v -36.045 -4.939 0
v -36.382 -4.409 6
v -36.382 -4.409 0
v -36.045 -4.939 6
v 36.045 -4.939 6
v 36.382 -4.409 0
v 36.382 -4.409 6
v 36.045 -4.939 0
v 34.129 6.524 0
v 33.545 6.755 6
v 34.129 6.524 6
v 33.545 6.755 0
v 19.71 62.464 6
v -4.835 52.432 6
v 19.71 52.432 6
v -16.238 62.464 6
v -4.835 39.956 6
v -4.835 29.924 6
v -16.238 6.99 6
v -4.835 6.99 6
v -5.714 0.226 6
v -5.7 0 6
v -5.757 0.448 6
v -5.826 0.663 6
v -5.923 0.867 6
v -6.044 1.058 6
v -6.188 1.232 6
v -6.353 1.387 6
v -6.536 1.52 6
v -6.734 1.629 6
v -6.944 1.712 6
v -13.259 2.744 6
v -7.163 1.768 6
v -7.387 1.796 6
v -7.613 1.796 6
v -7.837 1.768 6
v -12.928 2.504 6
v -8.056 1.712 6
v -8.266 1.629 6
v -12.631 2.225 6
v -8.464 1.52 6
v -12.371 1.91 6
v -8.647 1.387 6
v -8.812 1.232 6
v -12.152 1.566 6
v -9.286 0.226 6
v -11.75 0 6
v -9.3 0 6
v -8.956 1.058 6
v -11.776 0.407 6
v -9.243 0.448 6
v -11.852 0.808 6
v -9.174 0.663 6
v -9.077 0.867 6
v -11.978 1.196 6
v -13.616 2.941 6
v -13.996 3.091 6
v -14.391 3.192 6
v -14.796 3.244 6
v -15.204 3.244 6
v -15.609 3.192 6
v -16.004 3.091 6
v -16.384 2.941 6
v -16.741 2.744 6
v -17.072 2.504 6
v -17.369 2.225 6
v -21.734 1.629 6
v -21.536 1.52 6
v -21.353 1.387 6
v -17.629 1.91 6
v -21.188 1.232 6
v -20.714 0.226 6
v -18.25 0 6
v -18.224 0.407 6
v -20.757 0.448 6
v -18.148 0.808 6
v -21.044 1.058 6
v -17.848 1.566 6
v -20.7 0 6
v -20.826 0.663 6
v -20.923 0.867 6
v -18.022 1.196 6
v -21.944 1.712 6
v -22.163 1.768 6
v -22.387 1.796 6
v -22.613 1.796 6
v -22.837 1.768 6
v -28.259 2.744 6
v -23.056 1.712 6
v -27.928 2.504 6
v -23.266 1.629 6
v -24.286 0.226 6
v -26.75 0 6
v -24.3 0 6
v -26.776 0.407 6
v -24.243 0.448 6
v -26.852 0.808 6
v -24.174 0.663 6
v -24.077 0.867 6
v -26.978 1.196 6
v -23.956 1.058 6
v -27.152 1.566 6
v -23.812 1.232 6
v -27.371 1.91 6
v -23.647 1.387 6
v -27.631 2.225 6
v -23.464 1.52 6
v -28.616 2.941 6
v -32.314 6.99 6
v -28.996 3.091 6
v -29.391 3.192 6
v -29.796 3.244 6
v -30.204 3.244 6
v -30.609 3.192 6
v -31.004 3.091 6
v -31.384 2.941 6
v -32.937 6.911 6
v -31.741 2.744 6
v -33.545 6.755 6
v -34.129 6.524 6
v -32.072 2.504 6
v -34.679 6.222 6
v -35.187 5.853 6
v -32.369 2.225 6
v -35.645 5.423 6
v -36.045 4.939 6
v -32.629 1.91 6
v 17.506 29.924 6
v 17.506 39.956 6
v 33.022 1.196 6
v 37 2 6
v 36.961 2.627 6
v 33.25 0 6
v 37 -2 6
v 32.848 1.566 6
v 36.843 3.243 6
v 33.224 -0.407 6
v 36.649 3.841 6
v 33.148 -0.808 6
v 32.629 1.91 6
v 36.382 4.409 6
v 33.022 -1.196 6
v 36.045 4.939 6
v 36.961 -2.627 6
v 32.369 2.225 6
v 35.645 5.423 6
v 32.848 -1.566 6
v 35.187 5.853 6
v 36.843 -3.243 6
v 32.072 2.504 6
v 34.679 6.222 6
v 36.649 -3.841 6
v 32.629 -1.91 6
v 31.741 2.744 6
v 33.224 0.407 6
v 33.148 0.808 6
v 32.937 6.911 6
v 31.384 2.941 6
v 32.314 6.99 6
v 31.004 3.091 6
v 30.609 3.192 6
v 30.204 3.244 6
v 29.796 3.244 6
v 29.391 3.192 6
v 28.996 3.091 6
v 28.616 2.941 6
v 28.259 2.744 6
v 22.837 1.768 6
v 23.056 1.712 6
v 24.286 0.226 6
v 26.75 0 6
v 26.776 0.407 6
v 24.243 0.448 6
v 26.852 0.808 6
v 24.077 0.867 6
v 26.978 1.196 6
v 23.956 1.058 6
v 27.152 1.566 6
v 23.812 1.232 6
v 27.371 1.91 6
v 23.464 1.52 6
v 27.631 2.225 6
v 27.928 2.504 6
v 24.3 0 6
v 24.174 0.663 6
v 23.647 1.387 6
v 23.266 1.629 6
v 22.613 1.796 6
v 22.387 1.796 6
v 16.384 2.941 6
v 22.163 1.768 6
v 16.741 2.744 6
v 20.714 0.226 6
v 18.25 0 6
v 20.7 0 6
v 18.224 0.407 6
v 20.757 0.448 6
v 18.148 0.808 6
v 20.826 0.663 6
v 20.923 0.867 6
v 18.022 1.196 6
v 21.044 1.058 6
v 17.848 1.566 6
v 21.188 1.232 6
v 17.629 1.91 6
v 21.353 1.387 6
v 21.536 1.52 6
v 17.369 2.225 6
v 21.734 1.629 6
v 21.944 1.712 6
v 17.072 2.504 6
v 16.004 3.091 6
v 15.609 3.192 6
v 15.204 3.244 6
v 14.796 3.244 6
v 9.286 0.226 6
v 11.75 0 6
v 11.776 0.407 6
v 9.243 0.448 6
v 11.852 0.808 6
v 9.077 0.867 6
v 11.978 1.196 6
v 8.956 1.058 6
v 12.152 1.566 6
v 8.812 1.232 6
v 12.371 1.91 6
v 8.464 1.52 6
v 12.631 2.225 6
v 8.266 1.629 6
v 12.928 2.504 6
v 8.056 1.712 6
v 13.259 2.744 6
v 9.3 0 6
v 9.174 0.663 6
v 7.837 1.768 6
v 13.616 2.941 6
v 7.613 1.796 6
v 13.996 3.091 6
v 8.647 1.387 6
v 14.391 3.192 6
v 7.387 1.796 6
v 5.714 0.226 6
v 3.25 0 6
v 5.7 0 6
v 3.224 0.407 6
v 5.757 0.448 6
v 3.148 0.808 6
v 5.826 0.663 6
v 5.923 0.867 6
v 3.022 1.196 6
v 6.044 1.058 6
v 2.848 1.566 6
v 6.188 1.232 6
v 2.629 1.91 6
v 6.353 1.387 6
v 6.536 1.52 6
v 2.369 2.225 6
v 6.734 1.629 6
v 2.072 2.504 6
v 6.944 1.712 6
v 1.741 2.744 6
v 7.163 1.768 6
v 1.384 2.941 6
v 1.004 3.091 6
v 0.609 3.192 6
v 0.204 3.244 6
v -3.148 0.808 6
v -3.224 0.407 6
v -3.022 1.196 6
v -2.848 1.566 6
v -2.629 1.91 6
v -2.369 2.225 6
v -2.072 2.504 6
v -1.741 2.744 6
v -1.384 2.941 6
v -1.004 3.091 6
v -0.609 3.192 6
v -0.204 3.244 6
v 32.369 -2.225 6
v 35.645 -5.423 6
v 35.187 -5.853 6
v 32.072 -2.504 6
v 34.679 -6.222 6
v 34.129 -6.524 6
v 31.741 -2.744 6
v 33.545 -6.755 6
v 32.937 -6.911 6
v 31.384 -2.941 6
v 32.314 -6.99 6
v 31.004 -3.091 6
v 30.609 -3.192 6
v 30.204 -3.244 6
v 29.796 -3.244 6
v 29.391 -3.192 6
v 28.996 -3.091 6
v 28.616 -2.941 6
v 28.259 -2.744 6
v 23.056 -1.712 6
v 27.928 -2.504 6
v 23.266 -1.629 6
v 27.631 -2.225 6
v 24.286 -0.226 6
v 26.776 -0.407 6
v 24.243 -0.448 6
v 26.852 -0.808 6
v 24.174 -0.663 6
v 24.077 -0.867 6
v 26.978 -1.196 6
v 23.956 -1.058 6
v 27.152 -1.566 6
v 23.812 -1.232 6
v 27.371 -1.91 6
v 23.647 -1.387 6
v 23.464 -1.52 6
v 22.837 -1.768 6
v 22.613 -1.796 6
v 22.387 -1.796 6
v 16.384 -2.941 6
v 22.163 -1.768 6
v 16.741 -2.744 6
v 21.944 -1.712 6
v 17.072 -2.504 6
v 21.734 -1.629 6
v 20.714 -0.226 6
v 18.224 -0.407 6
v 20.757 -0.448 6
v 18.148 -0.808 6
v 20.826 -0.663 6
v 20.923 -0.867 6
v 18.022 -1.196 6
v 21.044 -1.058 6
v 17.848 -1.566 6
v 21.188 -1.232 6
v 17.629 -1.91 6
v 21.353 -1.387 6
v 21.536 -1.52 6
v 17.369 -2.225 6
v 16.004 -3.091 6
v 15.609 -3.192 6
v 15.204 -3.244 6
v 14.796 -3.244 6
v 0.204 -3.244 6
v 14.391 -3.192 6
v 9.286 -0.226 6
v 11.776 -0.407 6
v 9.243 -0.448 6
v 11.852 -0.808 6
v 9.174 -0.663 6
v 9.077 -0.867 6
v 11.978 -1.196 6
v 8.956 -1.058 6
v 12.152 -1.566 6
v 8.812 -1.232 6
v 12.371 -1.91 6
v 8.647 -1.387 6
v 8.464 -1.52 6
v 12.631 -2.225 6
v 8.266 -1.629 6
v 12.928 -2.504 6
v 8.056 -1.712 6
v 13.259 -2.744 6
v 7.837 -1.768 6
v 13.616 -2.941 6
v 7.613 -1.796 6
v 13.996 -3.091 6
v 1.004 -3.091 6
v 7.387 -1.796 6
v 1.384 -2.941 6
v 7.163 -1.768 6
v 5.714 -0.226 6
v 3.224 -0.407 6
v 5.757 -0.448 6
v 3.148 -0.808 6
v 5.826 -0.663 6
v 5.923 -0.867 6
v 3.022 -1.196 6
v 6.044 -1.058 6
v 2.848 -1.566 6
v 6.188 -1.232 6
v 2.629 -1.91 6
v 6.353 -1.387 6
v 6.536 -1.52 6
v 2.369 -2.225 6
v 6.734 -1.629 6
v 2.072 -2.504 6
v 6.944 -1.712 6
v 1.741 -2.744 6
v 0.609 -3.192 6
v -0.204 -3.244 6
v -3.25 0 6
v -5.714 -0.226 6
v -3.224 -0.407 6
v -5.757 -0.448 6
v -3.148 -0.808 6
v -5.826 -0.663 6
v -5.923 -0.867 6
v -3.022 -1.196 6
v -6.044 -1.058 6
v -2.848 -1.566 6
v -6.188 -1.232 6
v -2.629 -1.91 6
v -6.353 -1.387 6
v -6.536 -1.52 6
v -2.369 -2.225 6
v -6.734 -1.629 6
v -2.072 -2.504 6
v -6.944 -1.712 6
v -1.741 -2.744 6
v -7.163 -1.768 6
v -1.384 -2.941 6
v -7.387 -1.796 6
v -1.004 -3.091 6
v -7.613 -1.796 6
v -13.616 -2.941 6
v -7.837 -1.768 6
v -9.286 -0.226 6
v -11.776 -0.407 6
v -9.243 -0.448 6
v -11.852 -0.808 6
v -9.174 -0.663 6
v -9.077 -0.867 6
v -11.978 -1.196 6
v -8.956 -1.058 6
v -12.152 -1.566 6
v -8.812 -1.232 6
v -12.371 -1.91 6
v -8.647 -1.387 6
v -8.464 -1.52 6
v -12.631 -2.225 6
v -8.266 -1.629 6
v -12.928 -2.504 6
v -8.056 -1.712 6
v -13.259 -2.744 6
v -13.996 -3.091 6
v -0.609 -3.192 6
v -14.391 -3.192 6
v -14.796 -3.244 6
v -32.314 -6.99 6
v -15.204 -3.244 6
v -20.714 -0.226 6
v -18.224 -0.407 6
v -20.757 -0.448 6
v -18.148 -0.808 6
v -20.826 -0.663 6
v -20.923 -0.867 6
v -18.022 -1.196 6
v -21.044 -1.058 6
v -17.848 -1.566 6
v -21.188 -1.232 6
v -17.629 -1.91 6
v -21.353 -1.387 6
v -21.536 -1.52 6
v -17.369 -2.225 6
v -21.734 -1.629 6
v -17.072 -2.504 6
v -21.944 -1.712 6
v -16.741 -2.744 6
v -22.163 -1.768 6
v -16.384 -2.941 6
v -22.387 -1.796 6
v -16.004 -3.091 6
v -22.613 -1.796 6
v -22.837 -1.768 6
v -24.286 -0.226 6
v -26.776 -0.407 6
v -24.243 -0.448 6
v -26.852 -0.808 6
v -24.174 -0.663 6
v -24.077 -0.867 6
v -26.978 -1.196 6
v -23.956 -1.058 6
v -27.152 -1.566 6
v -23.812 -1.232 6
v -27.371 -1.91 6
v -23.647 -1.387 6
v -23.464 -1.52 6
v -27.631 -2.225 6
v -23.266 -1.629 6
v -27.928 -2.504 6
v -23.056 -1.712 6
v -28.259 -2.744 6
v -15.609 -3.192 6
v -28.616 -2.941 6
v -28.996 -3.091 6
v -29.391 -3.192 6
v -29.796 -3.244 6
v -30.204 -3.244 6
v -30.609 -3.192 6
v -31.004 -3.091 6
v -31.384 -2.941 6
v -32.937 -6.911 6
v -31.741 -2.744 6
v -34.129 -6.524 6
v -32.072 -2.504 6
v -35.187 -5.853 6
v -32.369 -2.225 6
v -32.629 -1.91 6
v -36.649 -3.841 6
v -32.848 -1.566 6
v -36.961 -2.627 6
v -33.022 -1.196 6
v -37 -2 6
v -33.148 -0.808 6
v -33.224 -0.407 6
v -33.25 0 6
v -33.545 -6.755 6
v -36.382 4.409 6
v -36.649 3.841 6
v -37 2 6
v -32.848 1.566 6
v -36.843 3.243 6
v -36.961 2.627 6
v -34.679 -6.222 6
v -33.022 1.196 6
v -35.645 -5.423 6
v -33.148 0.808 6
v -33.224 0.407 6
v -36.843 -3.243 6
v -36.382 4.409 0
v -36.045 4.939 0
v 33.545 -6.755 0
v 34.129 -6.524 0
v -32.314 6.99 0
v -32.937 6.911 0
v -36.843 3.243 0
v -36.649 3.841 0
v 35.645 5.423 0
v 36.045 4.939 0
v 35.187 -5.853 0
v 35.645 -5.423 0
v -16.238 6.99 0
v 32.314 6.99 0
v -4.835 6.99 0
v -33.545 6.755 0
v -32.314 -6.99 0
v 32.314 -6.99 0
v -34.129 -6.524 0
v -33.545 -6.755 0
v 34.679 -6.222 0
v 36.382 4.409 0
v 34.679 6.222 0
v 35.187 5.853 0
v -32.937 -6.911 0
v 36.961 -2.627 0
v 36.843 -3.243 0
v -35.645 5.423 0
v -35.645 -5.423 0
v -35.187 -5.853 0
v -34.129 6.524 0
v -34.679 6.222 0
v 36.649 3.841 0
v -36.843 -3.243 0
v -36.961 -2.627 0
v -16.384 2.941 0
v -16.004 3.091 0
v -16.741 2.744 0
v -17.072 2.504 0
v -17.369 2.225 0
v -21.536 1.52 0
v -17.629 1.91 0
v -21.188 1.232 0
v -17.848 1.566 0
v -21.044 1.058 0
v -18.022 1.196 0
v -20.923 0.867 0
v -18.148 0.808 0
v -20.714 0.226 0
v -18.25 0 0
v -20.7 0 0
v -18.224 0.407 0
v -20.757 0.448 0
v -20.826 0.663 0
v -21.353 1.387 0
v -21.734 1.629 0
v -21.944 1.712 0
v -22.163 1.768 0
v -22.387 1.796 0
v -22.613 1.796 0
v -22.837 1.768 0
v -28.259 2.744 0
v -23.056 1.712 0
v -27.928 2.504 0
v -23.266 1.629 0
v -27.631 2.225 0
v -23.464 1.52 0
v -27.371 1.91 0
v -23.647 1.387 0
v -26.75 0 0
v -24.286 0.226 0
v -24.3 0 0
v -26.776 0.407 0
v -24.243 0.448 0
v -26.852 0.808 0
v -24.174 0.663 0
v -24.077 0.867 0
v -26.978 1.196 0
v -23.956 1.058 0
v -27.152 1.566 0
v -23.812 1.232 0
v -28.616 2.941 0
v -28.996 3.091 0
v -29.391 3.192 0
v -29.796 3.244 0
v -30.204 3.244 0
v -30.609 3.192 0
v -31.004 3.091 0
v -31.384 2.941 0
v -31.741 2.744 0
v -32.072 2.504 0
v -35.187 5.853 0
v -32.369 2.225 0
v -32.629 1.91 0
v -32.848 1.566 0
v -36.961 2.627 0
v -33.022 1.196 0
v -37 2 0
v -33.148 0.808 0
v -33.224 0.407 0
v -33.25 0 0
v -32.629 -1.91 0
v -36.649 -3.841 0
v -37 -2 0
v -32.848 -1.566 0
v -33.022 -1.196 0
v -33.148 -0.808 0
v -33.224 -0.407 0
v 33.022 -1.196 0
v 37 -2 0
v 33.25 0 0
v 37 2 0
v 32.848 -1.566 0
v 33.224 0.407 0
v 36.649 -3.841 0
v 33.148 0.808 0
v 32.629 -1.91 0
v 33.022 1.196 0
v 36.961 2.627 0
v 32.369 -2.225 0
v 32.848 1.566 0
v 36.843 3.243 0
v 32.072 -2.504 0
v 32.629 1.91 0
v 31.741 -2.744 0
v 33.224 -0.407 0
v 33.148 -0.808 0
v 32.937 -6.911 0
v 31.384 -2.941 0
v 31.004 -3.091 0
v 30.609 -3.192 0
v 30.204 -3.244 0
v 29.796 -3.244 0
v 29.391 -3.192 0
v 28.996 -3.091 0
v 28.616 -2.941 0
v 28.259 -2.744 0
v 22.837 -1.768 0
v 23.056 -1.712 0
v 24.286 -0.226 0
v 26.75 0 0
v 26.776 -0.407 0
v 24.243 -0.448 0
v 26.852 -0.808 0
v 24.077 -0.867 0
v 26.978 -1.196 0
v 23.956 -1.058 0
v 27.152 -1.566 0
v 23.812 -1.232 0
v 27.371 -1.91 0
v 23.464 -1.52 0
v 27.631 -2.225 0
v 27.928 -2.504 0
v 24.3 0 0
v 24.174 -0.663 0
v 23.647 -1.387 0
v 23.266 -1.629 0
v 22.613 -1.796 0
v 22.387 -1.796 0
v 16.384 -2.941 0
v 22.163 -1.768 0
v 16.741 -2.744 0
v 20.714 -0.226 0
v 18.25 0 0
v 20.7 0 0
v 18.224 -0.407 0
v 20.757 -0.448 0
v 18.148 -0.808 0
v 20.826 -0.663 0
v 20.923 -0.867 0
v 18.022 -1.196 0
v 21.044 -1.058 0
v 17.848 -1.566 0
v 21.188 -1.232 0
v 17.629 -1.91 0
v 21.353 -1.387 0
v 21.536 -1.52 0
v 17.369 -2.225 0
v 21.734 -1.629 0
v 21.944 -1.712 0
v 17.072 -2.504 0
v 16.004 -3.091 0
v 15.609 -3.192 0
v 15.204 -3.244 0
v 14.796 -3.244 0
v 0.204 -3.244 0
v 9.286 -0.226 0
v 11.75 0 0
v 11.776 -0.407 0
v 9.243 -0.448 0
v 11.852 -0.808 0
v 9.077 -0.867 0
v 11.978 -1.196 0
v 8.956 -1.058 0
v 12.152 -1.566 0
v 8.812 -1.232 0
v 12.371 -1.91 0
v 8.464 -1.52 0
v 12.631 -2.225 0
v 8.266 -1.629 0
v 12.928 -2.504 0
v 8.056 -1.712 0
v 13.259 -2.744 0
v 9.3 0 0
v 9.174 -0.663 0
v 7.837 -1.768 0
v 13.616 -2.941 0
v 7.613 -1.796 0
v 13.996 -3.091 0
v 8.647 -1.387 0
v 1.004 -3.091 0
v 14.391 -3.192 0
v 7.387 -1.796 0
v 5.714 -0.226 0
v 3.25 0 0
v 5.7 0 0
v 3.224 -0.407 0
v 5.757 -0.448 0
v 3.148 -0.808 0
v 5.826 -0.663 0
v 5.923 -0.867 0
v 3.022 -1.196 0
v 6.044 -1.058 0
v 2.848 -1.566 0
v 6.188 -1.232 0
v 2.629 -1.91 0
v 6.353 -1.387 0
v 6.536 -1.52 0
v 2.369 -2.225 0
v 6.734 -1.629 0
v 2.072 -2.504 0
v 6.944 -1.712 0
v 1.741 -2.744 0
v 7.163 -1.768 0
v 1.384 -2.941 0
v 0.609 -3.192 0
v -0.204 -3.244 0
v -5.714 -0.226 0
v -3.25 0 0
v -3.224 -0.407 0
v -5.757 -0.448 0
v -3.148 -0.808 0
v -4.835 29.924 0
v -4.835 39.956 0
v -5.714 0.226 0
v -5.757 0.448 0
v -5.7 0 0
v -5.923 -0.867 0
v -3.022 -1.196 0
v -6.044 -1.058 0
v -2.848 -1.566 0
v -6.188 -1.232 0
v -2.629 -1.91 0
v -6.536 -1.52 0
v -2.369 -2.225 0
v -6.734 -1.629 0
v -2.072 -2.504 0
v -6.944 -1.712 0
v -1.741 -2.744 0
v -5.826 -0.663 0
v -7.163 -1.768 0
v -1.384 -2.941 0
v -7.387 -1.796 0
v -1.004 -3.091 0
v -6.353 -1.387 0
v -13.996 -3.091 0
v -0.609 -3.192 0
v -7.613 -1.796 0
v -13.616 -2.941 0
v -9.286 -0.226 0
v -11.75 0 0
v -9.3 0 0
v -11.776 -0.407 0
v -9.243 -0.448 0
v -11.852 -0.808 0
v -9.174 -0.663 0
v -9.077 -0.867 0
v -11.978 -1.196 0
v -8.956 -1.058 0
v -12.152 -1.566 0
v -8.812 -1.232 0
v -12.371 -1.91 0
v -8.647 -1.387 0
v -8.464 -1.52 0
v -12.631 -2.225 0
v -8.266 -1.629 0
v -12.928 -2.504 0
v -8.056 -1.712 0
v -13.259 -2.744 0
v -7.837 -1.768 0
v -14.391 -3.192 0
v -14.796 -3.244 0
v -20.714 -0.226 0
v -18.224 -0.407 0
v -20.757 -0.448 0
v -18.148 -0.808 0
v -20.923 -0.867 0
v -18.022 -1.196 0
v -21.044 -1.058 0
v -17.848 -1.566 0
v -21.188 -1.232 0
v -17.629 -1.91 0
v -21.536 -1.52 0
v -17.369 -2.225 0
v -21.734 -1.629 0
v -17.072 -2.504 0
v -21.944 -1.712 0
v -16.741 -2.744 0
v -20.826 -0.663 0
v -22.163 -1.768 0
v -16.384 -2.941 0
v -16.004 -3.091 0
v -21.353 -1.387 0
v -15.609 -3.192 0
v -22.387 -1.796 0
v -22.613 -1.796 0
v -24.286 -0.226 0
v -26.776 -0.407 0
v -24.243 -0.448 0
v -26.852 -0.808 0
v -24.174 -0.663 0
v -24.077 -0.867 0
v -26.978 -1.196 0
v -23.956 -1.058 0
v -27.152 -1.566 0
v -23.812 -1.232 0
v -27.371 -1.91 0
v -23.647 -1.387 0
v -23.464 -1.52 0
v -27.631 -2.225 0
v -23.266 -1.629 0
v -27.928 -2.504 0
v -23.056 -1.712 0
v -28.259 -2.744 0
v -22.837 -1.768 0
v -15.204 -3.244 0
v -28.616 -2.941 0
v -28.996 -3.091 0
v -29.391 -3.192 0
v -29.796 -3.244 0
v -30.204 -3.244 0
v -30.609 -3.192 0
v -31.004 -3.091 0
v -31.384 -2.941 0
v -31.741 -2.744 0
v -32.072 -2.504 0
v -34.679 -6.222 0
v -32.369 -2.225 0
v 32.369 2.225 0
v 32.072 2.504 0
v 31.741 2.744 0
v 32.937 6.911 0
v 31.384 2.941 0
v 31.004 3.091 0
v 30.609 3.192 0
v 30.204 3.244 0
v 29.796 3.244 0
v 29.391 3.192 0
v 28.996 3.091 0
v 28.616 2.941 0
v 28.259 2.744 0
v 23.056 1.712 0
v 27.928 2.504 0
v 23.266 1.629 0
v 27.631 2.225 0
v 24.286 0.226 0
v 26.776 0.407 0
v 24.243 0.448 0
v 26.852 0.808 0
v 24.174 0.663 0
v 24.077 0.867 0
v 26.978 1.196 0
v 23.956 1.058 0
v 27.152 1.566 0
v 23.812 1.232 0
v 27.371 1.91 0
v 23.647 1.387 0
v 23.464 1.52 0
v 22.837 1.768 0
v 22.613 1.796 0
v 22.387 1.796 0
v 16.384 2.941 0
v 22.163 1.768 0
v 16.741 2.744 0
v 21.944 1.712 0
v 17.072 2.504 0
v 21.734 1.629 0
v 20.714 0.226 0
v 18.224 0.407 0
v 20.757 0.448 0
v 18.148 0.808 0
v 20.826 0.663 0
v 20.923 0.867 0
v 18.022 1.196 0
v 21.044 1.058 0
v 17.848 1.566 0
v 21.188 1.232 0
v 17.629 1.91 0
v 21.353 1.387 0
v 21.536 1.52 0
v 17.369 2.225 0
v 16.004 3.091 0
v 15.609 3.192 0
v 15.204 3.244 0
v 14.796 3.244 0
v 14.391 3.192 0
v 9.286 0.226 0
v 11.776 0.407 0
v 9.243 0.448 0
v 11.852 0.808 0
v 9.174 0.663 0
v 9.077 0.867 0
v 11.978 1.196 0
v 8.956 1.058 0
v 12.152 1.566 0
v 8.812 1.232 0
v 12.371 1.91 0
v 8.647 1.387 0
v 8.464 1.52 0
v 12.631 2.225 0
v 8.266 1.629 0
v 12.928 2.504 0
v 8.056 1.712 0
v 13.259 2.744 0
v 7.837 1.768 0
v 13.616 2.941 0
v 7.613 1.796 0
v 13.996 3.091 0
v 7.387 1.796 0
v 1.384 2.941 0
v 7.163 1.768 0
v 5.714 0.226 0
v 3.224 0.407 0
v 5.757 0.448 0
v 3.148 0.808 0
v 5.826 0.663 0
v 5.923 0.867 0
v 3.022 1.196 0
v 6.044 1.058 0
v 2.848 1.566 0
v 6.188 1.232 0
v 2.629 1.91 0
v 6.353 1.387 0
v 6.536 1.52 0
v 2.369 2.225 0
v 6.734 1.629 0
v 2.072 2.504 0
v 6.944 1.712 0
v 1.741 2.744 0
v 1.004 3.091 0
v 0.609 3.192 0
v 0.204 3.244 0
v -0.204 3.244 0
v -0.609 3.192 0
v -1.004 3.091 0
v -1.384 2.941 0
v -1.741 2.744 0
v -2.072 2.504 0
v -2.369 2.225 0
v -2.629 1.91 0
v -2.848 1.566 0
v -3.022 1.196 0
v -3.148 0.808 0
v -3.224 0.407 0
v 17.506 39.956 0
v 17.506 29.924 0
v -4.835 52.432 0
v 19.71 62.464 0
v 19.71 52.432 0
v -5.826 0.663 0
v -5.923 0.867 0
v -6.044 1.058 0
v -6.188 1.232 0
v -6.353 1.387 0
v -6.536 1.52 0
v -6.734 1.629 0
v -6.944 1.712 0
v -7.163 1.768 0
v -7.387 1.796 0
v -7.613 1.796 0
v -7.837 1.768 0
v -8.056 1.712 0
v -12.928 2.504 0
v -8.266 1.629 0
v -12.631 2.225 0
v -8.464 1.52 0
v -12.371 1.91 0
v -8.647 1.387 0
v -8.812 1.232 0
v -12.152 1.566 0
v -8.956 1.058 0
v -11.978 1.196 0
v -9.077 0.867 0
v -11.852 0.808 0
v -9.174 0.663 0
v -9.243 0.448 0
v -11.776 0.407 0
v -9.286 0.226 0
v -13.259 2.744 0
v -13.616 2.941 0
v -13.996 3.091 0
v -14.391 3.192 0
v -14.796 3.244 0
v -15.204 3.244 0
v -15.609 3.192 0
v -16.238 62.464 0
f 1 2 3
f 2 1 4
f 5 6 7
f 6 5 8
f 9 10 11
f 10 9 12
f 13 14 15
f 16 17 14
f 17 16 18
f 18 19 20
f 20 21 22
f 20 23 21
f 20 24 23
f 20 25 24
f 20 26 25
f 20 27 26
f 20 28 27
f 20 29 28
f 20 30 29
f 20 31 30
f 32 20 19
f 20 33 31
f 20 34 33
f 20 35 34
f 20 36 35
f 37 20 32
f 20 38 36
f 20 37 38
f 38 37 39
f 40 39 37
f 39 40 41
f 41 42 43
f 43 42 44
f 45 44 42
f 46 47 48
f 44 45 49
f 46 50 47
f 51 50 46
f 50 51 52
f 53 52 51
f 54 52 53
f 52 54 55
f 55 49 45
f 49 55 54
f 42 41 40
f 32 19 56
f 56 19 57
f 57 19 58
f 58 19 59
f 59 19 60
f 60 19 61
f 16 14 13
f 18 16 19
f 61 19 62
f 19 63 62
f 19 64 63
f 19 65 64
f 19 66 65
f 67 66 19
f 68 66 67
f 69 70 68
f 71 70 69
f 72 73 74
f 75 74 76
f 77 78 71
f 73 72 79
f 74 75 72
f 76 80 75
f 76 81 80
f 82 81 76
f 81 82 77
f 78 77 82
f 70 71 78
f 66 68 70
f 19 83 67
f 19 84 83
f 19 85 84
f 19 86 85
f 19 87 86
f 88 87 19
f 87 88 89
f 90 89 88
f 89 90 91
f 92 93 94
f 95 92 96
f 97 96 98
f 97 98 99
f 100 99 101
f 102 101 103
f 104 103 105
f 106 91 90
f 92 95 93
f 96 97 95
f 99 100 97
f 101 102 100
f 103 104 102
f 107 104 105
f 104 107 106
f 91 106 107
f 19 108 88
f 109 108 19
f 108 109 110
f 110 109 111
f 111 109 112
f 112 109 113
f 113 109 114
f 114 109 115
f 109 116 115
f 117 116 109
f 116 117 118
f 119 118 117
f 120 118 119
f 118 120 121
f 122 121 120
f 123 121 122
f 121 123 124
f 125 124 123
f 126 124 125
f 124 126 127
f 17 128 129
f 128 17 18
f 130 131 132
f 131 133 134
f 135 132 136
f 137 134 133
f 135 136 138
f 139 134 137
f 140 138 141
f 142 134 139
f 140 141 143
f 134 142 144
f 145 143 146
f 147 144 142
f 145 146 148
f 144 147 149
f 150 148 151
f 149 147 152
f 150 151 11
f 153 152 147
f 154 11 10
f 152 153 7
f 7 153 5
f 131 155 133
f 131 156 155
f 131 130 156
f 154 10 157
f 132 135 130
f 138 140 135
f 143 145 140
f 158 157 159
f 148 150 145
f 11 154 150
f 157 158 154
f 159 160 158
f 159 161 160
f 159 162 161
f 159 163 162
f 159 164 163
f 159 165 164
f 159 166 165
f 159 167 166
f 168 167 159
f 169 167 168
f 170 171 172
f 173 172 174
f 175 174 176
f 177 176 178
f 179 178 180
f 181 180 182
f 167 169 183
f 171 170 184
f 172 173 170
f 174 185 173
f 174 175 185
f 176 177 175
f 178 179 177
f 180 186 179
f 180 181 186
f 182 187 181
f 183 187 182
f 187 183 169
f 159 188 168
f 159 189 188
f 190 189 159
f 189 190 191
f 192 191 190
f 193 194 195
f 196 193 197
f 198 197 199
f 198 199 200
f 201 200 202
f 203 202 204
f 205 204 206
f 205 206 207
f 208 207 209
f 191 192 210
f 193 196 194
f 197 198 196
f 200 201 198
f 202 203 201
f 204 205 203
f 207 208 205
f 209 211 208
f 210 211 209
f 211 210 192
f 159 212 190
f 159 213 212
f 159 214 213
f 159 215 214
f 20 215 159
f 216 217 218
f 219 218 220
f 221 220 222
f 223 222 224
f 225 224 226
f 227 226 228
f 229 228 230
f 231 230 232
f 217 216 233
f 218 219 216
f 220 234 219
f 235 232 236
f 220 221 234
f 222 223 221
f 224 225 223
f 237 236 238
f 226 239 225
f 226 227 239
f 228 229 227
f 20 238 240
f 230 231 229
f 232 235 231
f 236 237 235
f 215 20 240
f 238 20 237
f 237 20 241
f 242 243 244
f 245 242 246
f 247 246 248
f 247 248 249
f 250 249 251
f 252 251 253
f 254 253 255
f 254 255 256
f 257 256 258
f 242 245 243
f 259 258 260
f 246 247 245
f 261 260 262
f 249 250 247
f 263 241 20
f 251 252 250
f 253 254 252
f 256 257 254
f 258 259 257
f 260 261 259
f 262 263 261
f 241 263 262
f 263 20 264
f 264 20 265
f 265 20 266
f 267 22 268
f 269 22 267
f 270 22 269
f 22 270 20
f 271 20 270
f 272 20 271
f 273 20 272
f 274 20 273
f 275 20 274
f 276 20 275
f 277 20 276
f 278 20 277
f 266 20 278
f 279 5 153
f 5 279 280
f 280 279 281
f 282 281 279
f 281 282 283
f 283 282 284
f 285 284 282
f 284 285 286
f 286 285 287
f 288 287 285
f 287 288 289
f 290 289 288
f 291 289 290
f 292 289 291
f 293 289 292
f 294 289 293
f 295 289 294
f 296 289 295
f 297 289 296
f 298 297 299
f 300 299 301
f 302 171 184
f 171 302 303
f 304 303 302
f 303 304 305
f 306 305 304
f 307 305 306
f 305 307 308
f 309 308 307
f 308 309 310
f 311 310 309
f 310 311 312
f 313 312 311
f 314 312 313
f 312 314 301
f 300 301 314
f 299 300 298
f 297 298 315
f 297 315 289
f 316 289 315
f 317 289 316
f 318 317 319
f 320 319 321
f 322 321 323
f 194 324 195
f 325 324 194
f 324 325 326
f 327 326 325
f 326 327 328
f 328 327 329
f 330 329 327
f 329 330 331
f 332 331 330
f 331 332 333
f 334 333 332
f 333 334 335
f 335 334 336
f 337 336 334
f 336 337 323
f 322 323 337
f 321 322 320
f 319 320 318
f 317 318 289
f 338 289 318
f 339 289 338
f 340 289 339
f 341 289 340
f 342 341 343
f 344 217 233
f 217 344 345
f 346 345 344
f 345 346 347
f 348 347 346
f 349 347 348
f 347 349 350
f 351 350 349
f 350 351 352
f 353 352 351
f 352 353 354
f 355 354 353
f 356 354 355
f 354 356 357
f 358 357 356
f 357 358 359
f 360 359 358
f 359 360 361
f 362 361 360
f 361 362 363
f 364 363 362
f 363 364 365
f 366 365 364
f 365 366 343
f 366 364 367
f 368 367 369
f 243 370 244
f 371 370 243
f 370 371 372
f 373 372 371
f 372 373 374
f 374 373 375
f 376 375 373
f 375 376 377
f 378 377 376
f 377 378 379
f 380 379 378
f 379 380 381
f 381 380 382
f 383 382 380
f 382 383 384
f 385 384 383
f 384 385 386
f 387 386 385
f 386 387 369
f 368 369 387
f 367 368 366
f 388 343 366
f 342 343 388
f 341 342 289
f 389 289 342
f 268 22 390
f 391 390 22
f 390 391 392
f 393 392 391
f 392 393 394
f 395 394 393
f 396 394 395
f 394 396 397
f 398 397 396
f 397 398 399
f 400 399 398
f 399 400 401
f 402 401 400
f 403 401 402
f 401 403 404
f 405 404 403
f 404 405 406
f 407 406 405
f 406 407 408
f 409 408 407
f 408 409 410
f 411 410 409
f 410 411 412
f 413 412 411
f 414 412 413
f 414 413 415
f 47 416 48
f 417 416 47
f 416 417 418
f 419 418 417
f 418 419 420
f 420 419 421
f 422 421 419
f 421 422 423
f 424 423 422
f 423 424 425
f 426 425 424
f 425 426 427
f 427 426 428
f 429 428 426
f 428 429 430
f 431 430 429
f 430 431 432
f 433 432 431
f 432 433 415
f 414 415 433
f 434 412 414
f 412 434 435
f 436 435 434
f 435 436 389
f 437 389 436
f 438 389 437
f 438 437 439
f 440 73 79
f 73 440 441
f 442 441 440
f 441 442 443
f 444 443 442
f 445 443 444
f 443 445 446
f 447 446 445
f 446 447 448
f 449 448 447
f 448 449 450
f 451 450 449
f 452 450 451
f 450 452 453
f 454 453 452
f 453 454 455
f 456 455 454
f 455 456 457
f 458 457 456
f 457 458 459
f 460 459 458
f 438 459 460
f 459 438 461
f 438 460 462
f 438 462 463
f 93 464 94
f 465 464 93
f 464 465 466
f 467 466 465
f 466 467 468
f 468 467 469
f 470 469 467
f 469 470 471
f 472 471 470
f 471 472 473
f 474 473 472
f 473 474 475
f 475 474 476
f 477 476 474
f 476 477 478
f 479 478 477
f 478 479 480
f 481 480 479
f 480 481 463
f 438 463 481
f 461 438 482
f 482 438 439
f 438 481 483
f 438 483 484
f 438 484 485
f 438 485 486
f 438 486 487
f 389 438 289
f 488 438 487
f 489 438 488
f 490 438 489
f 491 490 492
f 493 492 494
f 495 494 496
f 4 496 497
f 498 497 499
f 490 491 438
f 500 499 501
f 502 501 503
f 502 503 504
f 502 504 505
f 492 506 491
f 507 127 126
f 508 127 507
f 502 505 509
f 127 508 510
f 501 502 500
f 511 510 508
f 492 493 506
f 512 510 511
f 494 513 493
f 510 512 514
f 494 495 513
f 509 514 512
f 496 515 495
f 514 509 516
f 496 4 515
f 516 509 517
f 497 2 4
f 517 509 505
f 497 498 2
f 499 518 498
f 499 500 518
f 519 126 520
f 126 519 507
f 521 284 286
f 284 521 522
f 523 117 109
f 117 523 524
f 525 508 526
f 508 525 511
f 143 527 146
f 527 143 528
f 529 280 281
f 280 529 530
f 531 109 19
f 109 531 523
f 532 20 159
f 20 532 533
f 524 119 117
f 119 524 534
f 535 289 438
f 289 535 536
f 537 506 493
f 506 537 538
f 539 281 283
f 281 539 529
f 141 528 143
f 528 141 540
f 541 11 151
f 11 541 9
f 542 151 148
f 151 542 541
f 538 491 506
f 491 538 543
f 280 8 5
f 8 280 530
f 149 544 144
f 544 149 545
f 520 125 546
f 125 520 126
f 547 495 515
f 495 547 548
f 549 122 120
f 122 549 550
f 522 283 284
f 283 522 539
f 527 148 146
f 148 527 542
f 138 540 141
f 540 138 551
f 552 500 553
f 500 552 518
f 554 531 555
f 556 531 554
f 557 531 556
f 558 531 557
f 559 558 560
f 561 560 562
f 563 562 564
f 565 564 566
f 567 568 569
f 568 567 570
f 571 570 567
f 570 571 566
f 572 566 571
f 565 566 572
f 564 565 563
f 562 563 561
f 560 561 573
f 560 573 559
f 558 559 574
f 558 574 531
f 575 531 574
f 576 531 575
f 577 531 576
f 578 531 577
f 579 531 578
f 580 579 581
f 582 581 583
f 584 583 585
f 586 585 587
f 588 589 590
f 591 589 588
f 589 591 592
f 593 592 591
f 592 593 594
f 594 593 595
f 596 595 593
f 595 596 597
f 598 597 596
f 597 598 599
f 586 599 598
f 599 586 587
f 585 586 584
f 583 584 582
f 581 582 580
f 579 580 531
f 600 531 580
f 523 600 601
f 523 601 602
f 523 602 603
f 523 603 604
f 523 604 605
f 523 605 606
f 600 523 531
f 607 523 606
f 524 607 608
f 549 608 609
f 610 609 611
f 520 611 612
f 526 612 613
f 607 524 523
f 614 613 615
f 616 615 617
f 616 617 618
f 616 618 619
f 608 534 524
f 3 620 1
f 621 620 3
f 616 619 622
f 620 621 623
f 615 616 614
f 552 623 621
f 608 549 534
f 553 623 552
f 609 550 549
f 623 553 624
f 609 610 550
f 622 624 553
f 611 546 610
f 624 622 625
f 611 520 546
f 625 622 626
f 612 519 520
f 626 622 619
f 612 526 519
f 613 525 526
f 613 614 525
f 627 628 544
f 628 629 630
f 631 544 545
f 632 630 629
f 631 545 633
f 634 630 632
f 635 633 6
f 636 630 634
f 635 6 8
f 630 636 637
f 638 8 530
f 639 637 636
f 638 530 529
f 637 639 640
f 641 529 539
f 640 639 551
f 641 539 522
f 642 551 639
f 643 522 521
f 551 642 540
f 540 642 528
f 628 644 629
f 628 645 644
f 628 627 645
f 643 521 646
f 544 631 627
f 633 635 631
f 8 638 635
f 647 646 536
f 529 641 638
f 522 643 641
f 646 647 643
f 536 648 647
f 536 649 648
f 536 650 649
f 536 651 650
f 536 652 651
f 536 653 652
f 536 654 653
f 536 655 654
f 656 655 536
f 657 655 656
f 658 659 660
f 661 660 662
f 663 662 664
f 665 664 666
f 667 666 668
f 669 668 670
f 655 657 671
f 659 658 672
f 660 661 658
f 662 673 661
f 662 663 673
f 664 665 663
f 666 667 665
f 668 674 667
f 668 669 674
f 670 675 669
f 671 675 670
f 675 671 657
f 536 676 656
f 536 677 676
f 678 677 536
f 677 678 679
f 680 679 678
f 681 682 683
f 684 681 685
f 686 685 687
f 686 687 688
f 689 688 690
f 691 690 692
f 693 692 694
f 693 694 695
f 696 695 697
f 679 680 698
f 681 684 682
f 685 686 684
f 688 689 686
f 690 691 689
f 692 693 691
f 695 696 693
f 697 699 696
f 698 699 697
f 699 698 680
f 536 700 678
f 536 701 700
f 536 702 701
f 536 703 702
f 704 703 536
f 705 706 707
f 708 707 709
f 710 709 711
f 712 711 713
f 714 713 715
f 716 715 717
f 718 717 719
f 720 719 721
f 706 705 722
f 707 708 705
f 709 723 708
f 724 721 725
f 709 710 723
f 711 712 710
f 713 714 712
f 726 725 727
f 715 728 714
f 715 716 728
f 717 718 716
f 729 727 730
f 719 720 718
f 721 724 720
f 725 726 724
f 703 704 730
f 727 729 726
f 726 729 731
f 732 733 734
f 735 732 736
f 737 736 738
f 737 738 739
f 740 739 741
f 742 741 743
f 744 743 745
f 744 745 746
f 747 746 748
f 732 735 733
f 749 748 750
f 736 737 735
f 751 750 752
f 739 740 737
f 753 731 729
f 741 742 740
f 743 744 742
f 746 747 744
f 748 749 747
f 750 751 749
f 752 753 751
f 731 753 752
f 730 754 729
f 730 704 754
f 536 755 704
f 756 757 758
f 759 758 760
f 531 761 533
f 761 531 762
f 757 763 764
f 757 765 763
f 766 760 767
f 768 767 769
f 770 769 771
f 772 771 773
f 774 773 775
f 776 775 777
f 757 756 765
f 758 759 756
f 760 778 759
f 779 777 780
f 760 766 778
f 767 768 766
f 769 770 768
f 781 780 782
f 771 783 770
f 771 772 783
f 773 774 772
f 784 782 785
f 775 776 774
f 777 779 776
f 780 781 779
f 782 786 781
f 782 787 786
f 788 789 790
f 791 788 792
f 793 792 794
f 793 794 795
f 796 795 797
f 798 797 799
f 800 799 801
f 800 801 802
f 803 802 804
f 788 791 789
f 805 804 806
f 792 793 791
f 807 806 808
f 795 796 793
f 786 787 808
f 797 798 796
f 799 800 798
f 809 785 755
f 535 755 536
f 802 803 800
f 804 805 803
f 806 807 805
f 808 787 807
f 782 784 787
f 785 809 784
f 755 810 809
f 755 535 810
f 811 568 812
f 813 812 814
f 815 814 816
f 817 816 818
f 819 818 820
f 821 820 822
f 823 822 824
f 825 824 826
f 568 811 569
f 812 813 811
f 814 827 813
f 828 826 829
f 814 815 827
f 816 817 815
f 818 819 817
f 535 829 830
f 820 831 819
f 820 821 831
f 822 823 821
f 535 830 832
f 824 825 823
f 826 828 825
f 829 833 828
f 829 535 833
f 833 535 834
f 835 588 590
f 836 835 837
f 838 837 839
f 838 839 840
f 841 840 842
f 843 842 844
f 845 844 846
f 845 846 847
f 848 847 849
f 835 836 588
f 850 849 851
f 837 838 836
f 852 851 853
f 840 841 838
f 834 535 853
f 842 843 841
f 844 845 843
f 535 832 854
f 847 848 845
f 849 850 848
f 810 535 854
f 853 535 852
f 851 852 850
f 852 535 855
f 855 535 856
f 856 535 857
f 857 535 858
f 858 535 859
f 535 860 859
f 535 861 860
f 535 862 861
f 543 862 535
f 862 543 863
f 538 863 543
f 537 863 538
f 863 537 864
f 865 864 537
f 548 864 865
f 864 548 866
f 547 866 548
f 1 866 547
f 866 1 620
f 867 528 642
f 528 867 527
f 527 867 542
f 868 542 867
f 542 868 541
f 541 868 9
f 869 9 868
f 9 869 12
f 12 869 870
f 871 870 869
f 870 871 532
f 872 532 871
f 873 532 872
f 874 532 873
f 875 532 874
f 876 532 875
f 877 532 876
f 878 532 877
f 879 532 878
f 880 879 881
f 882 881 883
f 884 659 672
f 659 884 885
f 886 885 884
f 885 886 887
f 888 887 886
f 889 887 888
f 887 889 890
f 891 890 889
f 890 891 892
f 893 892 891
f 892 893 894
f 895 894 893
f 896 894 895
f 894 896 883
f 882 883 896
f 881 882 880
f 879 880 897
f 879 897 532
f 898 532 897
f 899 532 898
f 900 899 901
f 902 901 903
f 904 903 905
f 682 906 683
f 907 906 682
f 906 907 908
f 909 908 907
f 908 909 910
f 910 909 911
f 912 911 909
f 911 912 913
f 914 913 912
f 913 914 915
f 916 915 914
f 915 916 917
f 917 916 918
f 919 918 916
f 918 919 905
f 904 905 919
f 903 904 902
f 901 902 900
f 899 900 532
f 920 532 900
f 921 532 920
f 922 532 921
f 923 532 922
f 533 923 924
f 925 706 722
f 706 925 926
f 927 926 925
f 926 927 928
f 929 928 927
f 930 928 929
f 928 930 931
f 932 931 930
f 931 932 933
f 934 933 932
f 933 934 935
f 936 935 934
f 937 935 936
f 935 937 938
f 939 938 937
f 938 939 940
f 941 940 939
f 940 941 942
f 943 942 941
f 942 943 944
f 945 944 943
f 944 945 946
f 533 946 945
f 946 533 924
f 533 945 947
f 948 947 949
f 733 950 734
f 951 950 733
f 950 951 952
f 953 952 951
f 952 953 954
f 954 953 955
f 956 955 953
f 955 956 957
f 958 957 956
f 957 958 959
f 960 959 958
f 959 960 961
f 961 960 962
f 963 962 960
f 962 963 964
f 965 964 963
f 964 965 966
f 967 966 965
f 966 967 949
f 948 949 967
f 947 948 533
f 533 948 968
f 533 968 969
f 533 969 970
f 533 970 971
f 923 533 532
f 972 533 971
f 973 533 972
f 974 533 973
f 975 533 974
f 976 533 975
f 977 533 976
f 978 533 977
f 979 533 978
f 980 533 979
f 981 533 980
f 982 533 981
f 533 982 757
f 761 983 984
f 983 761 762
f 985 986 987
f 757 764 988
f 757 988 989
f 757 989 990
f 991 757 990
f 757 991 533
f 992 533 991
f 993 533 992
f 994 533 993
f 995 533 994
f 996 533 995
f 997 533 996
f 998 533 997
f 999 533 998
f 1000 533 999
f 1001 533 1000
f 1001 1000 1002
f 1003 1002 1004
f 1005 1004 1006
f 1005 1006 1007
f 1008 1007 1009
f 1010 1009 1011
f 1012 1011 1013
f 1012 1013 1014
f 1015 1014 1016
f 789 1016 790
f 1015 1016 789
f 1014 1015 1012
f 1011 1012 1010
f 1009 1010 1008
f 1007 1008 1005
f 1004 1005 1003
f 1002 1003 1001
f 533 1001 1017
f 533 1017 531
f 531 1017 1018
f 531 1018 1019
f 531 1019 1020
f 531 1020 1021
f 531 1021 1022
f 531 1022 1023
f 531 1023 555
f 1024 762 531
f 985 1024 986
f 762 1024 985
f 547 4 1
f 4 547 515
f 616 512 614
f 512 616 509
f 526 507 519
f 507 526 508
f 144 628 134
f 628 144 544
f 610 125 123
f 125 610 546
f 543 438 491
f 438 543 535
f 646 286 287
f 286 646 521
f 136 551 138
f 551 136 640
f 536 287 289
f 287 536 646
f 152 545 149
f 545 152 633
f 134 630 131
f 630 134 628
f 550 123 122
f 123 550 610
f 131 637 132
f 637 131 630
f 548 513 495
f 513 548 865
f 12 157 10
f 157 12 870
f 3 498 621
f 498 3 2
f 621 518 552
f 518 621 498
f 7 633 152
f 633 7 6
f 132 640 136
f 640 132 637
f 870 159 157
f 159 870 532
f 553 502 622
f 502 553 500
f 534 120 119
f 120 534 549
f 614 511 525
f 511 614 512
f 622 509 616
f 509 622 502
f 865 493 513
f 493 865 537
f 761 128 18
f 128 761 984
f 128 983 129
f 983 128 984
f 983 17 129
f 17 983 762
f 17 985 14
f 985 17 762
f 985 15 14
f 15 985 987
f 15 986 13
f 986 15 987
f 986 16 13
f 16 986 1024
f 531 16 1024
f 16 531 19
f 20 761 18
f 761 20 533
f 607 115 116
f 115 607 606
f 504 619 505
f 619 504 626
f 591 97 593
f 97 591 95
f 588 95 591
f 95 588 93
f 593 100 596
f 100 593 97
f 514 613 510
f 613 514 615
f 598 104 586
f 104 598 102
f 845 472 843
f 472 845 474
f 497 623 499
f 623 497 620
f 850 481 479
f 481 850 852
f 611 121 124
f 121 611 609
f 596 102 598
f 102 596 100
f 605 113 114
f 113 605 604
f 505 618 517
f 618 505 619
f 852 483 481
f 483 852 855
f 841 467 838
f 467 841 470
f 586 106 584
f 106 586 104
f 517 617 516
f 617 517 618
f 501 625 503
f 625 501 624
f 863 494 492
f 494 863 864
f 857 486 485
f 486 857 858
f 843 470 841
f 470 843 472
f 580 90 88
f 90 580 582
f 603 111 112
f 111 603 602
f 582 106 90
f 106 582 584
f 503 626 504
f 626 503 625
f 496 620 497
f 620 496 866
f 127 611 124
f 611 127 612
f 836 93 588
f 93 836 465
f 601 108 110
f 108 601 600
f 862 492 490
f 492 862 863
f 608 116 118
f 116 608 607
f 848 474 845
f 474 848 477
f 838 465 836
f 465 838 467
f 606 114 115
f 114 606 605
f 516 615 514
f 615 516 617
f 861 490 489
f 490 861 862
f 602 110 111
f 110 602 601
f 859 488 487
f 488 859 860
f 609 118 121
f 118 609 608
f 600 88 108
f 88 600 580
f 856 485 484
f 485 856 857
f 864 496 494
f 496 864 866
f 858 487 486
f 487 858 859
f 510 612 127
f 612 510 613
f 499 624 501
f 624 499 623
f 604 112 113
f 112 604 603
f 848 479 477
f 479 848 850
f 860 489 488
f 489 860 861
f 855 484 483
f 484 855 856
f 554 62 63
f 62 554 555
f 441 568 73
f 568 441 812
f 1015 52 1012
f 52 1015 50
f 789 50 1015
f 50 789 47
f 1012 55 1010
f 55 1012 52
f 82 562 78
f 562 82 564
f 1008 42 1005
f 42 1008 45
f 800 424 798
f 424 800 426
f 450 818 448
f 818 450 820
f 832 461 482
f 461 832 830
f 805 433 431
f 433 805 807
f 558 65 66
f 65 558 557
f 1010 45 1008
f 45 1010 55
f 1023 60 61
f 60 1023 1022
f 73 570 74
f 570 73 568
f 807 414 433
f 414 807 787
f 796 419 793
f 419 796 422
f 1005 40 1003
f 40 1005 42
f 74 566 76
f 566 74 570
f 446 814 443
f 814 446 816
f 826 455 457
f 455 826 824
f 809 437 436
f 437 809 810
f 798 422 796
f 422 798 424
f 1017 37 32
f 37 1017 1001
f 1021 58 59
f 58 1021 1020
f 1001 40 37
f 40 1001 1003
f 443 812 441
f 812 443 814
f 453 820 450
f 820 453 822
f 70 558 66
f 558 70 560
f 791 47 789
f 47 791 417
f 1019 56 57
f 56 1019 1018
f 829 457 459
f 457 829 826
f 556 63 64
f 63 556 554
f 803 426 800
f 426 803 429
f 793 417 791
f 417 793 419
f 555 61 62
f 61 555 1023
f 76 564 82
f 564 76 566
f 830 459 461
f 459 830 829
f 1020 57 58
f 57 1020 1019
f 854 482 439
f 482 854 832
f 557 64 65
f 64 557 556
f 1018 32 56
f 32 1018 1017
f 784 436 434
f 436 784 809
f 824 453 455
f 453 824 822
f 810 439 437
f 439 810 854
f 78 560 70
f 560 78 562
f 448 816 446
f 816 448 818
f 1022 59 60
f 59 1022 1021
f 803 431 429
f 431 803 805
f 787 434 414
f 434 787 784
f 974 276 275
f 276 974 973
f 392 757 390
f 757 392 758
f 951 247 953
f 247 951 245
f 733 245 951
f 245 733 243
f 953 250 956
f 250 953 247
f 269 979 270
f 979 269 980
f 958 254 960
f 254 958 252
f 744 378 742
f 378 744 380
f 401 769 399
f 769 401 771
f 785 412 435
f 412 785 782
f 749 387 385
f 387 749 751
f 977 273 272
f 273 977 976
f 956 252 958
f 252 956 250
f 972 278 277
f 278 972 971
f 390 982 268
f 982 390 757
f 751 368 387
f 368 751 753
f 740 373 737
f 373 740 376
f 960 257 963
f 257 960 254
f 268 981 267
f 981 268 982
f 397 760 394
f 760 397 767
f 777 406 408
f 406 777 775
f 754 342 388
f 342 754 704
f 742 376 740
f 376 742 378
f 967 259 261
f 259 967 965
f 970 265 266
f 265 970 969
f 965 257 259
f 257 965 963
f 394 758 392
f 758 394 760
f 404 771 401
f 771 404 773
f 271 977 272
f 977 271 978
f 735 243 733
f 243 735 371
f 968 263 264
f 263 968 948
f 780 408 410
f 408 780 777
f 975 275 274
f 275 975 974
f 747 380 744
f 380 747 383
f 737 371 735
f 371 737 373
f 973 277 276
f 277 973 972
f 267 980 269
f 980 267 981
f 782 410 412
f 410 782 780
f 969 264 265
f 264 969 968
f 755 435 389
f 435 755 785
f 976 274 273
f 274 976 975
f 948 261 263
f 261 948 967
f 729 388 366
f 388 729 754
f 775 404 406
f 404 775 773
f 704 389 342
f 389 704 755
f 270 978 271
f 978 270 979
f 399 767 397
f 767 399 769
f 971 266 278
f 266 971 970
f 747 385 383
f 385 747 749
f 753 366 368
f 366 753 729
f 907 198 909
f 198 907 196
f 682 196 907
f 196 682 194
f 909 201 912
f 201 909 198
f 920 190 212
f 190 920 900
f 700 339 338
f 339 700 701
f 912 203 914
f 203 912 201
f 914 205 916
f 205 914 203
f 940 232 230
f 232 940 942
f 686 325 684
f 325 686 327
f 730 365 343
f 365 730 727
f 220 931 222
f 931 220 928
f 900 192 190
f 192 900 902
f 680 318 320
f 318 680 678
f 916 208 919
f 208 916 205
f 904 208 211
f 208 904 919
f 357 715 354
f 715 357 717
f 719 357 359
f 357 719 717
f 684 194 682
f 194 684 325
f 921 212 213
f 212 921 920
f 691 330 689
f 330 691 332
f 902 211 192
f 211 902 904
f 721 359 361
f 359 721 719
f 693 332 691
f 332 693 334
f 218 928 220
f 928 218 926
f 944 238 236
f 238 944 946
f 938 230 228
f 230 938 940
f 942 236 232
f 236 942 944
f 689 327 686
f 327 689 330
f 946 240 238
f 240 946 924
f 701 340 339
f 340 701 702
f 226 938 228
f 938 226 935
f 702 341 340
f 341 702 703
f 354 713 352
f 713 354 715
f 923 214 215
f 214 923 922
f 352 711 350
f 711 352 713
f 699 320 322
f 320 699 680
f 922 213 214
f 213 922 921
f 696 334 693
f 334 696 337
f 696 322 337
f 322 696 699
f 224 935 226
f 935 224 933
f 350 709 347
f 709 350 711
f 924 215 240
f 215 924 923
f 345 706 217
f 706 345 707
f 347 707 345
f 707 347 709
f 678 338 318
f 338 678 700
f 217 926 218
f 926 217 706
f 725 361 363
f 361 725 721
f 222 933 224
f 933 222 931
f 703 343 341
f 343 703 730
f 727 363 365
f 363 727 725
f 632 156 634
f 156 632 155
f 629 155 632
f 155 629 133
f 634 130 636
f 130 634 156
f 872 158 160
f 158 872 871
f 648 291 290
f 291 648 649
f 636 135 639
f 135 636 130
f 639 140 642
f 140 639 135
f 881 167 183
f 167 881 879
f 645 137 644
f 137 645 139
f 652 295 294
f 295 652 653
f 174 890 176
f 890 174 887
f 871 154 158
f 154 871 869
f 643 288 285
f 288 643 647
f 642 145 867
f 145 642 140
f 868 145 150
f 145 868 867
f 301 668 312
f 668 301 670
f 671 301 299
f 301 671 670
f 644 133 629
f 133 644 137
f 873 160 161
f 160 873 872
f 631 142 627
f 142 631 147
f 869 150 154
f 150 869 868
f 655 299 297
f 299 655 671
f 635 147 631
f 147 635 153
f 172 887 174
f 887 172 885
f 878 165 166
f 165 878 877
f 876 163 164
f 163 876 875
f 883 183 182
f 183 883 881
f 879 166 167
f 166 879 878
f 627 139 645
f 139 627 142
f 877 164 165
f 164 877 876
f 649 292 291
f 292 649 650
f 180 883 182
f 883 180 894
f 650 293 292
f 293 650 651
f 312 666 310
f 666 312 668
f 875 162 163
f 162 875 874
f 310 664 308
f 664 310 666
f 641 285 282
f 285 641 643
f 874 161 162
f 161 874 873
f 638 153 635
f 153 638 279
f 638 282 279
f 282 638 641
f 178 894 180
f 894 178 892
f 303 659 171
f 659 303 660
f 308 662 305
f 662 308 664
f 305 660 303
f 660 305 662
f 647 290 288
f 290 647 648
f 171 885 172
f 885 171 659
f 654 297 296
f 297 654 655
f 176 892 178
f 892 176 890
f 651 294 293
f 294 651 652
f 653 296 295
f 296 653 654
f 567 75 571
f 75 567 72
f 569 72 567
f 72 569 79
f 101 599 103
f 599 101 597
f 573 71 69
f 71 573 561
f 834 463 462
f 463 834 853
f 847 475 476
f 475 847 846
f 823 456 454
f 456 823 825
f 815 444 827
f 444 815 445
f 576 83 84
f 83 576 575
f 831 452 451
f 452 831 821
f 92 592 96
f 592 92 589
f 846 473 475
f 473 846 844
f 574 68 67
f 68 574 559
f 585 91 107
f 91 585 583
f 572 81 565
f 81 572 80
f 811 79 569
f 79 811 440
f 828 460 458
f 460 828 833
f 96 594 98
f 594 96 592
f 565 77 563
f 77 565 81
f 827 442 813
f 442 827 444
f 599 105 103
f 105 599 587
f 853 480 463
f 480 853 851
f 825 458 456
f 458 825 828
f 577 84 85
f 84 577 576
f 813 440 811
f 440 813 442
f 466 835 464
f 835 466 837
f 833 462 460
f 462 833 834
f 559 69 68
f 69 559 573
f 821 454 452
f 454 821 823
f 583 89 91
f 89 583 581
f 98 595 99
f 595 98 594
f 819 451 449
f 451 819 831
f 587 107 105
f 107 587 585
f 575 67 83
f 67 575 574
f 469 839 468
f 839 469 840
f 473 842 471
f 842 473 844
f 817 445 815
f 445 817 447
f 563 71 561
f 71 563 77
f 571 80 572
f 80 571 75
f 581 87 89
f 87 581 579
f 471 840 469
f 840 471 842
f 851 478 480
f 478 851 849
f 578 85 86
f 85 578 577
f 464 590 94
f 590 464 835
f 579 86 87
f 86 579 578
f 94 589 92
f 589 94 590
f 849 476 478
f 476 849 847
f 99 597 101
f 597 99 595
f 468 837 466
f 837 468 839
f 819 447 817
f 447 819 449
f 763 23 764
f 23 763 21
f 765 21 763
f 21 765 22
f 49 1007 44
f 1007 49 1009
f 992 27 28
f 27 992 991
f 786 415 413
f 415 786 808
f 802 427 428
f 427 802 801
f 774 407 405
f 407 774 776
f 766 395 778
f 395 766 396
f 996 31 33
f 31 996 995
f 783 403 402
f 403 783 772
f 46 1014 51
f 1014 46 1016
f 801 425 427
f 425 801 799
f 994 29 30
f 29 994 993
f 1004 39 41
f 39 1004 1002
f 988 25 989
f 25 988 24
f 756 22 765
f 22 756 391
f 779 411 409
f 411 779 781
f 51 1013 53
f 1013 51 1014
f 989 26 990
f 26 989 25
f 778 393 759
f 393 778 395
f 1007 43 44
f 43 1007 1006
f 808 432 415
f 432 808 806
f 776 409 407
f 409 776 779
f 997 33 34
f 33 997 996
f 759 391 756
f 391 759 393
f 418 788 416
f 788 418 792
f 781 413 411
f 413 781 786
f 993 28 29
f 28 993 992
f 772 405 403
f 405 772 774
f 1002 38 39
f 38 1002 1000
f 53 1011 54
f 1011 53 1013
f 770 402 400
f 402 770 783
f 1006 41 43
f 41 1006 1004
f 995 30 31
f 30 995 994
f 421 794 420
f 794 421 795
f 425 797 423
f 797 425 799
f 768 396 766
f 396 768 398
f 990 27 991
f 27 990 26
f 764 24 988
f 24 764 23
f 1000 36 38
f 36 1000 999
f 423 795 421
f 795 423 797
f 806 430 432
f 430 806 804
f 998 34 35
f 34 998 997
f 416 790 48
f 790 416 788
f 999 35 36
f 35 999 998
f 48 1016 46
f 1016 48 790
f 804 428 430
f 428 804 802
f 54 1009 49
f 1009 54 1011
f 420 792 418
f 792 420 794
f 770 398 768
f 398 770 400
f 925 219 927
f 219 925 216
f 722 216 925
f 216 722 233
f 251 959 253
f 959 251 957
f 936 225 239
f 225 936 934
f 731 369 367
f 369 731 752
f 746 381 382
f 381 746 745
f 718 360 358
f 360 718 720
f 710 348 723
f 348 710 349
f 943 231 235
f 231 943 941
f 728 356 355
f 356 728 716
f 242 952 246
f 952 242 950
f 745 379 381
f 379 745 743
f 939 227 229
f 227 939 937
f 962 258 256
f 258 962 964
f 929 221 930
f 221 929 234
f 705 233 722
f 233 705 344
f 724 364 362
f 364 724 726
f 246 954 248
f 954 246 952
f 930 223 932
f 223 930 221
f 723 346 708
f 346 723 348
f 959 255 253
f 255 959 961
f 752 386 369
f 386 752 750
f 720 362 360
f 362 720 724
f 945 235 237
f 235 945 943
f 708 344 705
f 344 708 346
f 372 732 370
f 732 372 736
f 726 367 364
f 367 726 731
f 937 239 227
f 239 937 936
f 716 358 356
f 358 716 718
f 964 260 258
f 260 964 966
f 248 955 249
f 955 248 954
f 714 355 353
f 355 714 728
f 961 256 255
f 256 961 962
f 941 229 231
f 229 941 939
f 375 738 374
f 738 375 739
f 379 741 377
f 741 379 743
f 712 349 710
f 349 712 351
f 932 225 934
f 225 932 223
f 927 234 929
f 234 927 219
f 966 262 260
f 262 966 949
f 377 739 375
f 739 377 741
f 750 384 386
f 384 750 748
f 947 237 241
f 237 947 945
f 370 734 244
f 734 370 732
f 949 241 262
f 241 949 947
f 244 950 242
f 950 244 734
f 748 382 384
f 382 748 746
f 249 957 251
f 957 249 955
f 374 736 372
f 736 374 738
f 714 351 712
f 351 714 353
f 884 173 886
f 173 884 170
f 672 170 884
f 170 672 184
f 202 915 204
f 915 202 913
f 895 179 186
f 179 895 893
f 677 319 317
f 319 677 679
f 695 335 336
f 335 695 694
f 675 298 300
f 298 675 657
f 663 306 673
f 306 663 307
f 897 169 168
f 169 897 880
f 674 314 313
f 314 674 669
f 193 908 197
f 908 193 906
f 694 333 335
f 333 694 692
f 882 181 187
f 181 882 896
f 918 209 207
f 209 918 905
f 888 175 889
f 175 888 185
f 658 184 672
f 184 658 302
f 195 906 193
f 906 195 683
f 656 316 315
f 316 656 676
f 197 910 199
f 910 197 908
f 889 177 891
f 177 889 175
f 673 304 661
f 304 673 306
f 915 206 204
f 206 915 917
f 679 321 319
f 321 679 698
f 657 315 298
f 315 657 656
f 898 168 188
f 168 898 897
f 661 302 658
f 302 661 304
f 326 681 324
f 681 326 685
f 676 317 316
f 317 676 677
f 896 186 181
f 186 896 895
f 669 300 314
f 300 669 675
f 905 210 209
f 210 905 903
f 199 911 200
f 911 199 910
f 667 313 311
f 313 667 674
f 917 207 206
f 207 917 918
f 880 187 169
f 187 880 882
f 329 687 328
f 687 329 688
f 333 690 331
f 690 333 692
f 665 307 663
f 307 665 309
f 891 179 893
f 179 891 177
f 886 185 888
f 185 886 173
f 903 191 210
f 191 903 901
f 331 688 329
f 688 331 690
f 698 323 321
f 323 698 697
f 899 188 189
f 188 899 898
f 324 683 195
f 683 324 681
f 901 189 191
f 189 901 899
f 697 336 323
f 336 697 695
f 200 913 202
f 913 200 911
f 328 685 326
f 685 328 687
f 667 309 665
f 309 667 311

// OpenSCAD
$fn = 50;


difference() {
	union() {
		hull() {
			translate(v = [-32.0000000000, 2.0000000000, 0]) {
				cylinder(h = 6, r = 5);
			}
			translate(v = [32.0000000000, 2.0000000000, 0]) {
				cylinder(h = 6, r = 5);
			}
			translate(v = [-32.0000000000, -2.0000000000, 0]) {
				cylinder(h = 6, r = 5);
			}
			translate(v = [32.0000000000, -2.0000000000, 0]) {
				cylinder(h = 6, r = 5);
			}
		}
		translate(v = [0, 61.1111111111, 0]) {
			linear_extrude(height = 6) {
				text(font = "DejaVu Sans Mono:style=Bold", halign = "center", size = 57.0000000000, text = "F", valign = "top");
			}
		}
	}
	union() {
		translate(v = [-30.0000000000, 0.0000000000, 0]) {
			translate(v = [0, 0, -100]) {
				cylinder(h = 200, r = 3.2500000000);
			}
		}
		translate(v = [-15.0000000000, 0.0000000000, 0]) {
			translate(v = [0, 0, -100]) {
				cylinder(h = 200, r = 3.2500000000);
			}
		}
		translate(v = [0, 0, -100]) {
			cylinder(h = 200, r = 3.2500000000);
		}
		translate(v = [15.0000000000, 0.0000000000, 0]) {
			translate(v = [0, 0, -100]) {
				cylinder(h = 200, r = 3.2500000000);
			}
		}
		translate(v = [30.0000000000, 0.0000000000, 0]) {
			translate(v = [0, 0, -100]) {
				cylinder(h = 200, r = 3.2500000000);
			}
		}
		translate(v = [-30.0000000000, 0.0000000000, 0]) {
			translate(v = [0, 0, -100]) {
				cylinder(h = 200, r = 1.8000000000);
			}
		}
		translate(v = [-22.5000000000, 0.0000000000, 0]) {
			translate(v = [0, 0, -100]) {
				cylinder(h = 200, r = 1.8000000000);
			}
		}
		translate(v = [-15.0000000000, 0.0000000000, 0]) {
			translate(v = [0, 0, -100]) {
				cylinder(h = 200, r = 1.8000000000);
			}
		}
		translate(v = [-7.5000000000, 0.0000000000, 0]) {
			translate(v = [0, 0, -100]) {
				cylinder(h = 200, r = 1.8000000000);
			}
		}
		translate(v = [0, 0, -100]) {
			cylinder(h = 200, r = 1.8000000000);
		}
		translate(v = [7.5000000000, 0.0000000000, 0]) {
			translate(v = [0, 0, -100]) {
				cylinder(h = 200, r = 1.8000000000);
			}
		}
		translate(v = [15.0000000000, 0.0000000000, 0]) {
			translate(v = [0, 0, -100]) {
				cylinder(h = 200, r = 1.8000000000);
			}
		}
		translate(v = [22.5000000000, 0.0000000000, 0]) {
			translate(v = [0, 0, -100]) {
				cylinder(h = 200, r = 1.8000000000);
			}
		}
		translate(v = [30.0000000000, 0.0000000000, 0]) {
			translate(v = [0, 0, -100]) {
				cylinder(h = 200, r = 1.8000000000);
			}
		}
	}
}
